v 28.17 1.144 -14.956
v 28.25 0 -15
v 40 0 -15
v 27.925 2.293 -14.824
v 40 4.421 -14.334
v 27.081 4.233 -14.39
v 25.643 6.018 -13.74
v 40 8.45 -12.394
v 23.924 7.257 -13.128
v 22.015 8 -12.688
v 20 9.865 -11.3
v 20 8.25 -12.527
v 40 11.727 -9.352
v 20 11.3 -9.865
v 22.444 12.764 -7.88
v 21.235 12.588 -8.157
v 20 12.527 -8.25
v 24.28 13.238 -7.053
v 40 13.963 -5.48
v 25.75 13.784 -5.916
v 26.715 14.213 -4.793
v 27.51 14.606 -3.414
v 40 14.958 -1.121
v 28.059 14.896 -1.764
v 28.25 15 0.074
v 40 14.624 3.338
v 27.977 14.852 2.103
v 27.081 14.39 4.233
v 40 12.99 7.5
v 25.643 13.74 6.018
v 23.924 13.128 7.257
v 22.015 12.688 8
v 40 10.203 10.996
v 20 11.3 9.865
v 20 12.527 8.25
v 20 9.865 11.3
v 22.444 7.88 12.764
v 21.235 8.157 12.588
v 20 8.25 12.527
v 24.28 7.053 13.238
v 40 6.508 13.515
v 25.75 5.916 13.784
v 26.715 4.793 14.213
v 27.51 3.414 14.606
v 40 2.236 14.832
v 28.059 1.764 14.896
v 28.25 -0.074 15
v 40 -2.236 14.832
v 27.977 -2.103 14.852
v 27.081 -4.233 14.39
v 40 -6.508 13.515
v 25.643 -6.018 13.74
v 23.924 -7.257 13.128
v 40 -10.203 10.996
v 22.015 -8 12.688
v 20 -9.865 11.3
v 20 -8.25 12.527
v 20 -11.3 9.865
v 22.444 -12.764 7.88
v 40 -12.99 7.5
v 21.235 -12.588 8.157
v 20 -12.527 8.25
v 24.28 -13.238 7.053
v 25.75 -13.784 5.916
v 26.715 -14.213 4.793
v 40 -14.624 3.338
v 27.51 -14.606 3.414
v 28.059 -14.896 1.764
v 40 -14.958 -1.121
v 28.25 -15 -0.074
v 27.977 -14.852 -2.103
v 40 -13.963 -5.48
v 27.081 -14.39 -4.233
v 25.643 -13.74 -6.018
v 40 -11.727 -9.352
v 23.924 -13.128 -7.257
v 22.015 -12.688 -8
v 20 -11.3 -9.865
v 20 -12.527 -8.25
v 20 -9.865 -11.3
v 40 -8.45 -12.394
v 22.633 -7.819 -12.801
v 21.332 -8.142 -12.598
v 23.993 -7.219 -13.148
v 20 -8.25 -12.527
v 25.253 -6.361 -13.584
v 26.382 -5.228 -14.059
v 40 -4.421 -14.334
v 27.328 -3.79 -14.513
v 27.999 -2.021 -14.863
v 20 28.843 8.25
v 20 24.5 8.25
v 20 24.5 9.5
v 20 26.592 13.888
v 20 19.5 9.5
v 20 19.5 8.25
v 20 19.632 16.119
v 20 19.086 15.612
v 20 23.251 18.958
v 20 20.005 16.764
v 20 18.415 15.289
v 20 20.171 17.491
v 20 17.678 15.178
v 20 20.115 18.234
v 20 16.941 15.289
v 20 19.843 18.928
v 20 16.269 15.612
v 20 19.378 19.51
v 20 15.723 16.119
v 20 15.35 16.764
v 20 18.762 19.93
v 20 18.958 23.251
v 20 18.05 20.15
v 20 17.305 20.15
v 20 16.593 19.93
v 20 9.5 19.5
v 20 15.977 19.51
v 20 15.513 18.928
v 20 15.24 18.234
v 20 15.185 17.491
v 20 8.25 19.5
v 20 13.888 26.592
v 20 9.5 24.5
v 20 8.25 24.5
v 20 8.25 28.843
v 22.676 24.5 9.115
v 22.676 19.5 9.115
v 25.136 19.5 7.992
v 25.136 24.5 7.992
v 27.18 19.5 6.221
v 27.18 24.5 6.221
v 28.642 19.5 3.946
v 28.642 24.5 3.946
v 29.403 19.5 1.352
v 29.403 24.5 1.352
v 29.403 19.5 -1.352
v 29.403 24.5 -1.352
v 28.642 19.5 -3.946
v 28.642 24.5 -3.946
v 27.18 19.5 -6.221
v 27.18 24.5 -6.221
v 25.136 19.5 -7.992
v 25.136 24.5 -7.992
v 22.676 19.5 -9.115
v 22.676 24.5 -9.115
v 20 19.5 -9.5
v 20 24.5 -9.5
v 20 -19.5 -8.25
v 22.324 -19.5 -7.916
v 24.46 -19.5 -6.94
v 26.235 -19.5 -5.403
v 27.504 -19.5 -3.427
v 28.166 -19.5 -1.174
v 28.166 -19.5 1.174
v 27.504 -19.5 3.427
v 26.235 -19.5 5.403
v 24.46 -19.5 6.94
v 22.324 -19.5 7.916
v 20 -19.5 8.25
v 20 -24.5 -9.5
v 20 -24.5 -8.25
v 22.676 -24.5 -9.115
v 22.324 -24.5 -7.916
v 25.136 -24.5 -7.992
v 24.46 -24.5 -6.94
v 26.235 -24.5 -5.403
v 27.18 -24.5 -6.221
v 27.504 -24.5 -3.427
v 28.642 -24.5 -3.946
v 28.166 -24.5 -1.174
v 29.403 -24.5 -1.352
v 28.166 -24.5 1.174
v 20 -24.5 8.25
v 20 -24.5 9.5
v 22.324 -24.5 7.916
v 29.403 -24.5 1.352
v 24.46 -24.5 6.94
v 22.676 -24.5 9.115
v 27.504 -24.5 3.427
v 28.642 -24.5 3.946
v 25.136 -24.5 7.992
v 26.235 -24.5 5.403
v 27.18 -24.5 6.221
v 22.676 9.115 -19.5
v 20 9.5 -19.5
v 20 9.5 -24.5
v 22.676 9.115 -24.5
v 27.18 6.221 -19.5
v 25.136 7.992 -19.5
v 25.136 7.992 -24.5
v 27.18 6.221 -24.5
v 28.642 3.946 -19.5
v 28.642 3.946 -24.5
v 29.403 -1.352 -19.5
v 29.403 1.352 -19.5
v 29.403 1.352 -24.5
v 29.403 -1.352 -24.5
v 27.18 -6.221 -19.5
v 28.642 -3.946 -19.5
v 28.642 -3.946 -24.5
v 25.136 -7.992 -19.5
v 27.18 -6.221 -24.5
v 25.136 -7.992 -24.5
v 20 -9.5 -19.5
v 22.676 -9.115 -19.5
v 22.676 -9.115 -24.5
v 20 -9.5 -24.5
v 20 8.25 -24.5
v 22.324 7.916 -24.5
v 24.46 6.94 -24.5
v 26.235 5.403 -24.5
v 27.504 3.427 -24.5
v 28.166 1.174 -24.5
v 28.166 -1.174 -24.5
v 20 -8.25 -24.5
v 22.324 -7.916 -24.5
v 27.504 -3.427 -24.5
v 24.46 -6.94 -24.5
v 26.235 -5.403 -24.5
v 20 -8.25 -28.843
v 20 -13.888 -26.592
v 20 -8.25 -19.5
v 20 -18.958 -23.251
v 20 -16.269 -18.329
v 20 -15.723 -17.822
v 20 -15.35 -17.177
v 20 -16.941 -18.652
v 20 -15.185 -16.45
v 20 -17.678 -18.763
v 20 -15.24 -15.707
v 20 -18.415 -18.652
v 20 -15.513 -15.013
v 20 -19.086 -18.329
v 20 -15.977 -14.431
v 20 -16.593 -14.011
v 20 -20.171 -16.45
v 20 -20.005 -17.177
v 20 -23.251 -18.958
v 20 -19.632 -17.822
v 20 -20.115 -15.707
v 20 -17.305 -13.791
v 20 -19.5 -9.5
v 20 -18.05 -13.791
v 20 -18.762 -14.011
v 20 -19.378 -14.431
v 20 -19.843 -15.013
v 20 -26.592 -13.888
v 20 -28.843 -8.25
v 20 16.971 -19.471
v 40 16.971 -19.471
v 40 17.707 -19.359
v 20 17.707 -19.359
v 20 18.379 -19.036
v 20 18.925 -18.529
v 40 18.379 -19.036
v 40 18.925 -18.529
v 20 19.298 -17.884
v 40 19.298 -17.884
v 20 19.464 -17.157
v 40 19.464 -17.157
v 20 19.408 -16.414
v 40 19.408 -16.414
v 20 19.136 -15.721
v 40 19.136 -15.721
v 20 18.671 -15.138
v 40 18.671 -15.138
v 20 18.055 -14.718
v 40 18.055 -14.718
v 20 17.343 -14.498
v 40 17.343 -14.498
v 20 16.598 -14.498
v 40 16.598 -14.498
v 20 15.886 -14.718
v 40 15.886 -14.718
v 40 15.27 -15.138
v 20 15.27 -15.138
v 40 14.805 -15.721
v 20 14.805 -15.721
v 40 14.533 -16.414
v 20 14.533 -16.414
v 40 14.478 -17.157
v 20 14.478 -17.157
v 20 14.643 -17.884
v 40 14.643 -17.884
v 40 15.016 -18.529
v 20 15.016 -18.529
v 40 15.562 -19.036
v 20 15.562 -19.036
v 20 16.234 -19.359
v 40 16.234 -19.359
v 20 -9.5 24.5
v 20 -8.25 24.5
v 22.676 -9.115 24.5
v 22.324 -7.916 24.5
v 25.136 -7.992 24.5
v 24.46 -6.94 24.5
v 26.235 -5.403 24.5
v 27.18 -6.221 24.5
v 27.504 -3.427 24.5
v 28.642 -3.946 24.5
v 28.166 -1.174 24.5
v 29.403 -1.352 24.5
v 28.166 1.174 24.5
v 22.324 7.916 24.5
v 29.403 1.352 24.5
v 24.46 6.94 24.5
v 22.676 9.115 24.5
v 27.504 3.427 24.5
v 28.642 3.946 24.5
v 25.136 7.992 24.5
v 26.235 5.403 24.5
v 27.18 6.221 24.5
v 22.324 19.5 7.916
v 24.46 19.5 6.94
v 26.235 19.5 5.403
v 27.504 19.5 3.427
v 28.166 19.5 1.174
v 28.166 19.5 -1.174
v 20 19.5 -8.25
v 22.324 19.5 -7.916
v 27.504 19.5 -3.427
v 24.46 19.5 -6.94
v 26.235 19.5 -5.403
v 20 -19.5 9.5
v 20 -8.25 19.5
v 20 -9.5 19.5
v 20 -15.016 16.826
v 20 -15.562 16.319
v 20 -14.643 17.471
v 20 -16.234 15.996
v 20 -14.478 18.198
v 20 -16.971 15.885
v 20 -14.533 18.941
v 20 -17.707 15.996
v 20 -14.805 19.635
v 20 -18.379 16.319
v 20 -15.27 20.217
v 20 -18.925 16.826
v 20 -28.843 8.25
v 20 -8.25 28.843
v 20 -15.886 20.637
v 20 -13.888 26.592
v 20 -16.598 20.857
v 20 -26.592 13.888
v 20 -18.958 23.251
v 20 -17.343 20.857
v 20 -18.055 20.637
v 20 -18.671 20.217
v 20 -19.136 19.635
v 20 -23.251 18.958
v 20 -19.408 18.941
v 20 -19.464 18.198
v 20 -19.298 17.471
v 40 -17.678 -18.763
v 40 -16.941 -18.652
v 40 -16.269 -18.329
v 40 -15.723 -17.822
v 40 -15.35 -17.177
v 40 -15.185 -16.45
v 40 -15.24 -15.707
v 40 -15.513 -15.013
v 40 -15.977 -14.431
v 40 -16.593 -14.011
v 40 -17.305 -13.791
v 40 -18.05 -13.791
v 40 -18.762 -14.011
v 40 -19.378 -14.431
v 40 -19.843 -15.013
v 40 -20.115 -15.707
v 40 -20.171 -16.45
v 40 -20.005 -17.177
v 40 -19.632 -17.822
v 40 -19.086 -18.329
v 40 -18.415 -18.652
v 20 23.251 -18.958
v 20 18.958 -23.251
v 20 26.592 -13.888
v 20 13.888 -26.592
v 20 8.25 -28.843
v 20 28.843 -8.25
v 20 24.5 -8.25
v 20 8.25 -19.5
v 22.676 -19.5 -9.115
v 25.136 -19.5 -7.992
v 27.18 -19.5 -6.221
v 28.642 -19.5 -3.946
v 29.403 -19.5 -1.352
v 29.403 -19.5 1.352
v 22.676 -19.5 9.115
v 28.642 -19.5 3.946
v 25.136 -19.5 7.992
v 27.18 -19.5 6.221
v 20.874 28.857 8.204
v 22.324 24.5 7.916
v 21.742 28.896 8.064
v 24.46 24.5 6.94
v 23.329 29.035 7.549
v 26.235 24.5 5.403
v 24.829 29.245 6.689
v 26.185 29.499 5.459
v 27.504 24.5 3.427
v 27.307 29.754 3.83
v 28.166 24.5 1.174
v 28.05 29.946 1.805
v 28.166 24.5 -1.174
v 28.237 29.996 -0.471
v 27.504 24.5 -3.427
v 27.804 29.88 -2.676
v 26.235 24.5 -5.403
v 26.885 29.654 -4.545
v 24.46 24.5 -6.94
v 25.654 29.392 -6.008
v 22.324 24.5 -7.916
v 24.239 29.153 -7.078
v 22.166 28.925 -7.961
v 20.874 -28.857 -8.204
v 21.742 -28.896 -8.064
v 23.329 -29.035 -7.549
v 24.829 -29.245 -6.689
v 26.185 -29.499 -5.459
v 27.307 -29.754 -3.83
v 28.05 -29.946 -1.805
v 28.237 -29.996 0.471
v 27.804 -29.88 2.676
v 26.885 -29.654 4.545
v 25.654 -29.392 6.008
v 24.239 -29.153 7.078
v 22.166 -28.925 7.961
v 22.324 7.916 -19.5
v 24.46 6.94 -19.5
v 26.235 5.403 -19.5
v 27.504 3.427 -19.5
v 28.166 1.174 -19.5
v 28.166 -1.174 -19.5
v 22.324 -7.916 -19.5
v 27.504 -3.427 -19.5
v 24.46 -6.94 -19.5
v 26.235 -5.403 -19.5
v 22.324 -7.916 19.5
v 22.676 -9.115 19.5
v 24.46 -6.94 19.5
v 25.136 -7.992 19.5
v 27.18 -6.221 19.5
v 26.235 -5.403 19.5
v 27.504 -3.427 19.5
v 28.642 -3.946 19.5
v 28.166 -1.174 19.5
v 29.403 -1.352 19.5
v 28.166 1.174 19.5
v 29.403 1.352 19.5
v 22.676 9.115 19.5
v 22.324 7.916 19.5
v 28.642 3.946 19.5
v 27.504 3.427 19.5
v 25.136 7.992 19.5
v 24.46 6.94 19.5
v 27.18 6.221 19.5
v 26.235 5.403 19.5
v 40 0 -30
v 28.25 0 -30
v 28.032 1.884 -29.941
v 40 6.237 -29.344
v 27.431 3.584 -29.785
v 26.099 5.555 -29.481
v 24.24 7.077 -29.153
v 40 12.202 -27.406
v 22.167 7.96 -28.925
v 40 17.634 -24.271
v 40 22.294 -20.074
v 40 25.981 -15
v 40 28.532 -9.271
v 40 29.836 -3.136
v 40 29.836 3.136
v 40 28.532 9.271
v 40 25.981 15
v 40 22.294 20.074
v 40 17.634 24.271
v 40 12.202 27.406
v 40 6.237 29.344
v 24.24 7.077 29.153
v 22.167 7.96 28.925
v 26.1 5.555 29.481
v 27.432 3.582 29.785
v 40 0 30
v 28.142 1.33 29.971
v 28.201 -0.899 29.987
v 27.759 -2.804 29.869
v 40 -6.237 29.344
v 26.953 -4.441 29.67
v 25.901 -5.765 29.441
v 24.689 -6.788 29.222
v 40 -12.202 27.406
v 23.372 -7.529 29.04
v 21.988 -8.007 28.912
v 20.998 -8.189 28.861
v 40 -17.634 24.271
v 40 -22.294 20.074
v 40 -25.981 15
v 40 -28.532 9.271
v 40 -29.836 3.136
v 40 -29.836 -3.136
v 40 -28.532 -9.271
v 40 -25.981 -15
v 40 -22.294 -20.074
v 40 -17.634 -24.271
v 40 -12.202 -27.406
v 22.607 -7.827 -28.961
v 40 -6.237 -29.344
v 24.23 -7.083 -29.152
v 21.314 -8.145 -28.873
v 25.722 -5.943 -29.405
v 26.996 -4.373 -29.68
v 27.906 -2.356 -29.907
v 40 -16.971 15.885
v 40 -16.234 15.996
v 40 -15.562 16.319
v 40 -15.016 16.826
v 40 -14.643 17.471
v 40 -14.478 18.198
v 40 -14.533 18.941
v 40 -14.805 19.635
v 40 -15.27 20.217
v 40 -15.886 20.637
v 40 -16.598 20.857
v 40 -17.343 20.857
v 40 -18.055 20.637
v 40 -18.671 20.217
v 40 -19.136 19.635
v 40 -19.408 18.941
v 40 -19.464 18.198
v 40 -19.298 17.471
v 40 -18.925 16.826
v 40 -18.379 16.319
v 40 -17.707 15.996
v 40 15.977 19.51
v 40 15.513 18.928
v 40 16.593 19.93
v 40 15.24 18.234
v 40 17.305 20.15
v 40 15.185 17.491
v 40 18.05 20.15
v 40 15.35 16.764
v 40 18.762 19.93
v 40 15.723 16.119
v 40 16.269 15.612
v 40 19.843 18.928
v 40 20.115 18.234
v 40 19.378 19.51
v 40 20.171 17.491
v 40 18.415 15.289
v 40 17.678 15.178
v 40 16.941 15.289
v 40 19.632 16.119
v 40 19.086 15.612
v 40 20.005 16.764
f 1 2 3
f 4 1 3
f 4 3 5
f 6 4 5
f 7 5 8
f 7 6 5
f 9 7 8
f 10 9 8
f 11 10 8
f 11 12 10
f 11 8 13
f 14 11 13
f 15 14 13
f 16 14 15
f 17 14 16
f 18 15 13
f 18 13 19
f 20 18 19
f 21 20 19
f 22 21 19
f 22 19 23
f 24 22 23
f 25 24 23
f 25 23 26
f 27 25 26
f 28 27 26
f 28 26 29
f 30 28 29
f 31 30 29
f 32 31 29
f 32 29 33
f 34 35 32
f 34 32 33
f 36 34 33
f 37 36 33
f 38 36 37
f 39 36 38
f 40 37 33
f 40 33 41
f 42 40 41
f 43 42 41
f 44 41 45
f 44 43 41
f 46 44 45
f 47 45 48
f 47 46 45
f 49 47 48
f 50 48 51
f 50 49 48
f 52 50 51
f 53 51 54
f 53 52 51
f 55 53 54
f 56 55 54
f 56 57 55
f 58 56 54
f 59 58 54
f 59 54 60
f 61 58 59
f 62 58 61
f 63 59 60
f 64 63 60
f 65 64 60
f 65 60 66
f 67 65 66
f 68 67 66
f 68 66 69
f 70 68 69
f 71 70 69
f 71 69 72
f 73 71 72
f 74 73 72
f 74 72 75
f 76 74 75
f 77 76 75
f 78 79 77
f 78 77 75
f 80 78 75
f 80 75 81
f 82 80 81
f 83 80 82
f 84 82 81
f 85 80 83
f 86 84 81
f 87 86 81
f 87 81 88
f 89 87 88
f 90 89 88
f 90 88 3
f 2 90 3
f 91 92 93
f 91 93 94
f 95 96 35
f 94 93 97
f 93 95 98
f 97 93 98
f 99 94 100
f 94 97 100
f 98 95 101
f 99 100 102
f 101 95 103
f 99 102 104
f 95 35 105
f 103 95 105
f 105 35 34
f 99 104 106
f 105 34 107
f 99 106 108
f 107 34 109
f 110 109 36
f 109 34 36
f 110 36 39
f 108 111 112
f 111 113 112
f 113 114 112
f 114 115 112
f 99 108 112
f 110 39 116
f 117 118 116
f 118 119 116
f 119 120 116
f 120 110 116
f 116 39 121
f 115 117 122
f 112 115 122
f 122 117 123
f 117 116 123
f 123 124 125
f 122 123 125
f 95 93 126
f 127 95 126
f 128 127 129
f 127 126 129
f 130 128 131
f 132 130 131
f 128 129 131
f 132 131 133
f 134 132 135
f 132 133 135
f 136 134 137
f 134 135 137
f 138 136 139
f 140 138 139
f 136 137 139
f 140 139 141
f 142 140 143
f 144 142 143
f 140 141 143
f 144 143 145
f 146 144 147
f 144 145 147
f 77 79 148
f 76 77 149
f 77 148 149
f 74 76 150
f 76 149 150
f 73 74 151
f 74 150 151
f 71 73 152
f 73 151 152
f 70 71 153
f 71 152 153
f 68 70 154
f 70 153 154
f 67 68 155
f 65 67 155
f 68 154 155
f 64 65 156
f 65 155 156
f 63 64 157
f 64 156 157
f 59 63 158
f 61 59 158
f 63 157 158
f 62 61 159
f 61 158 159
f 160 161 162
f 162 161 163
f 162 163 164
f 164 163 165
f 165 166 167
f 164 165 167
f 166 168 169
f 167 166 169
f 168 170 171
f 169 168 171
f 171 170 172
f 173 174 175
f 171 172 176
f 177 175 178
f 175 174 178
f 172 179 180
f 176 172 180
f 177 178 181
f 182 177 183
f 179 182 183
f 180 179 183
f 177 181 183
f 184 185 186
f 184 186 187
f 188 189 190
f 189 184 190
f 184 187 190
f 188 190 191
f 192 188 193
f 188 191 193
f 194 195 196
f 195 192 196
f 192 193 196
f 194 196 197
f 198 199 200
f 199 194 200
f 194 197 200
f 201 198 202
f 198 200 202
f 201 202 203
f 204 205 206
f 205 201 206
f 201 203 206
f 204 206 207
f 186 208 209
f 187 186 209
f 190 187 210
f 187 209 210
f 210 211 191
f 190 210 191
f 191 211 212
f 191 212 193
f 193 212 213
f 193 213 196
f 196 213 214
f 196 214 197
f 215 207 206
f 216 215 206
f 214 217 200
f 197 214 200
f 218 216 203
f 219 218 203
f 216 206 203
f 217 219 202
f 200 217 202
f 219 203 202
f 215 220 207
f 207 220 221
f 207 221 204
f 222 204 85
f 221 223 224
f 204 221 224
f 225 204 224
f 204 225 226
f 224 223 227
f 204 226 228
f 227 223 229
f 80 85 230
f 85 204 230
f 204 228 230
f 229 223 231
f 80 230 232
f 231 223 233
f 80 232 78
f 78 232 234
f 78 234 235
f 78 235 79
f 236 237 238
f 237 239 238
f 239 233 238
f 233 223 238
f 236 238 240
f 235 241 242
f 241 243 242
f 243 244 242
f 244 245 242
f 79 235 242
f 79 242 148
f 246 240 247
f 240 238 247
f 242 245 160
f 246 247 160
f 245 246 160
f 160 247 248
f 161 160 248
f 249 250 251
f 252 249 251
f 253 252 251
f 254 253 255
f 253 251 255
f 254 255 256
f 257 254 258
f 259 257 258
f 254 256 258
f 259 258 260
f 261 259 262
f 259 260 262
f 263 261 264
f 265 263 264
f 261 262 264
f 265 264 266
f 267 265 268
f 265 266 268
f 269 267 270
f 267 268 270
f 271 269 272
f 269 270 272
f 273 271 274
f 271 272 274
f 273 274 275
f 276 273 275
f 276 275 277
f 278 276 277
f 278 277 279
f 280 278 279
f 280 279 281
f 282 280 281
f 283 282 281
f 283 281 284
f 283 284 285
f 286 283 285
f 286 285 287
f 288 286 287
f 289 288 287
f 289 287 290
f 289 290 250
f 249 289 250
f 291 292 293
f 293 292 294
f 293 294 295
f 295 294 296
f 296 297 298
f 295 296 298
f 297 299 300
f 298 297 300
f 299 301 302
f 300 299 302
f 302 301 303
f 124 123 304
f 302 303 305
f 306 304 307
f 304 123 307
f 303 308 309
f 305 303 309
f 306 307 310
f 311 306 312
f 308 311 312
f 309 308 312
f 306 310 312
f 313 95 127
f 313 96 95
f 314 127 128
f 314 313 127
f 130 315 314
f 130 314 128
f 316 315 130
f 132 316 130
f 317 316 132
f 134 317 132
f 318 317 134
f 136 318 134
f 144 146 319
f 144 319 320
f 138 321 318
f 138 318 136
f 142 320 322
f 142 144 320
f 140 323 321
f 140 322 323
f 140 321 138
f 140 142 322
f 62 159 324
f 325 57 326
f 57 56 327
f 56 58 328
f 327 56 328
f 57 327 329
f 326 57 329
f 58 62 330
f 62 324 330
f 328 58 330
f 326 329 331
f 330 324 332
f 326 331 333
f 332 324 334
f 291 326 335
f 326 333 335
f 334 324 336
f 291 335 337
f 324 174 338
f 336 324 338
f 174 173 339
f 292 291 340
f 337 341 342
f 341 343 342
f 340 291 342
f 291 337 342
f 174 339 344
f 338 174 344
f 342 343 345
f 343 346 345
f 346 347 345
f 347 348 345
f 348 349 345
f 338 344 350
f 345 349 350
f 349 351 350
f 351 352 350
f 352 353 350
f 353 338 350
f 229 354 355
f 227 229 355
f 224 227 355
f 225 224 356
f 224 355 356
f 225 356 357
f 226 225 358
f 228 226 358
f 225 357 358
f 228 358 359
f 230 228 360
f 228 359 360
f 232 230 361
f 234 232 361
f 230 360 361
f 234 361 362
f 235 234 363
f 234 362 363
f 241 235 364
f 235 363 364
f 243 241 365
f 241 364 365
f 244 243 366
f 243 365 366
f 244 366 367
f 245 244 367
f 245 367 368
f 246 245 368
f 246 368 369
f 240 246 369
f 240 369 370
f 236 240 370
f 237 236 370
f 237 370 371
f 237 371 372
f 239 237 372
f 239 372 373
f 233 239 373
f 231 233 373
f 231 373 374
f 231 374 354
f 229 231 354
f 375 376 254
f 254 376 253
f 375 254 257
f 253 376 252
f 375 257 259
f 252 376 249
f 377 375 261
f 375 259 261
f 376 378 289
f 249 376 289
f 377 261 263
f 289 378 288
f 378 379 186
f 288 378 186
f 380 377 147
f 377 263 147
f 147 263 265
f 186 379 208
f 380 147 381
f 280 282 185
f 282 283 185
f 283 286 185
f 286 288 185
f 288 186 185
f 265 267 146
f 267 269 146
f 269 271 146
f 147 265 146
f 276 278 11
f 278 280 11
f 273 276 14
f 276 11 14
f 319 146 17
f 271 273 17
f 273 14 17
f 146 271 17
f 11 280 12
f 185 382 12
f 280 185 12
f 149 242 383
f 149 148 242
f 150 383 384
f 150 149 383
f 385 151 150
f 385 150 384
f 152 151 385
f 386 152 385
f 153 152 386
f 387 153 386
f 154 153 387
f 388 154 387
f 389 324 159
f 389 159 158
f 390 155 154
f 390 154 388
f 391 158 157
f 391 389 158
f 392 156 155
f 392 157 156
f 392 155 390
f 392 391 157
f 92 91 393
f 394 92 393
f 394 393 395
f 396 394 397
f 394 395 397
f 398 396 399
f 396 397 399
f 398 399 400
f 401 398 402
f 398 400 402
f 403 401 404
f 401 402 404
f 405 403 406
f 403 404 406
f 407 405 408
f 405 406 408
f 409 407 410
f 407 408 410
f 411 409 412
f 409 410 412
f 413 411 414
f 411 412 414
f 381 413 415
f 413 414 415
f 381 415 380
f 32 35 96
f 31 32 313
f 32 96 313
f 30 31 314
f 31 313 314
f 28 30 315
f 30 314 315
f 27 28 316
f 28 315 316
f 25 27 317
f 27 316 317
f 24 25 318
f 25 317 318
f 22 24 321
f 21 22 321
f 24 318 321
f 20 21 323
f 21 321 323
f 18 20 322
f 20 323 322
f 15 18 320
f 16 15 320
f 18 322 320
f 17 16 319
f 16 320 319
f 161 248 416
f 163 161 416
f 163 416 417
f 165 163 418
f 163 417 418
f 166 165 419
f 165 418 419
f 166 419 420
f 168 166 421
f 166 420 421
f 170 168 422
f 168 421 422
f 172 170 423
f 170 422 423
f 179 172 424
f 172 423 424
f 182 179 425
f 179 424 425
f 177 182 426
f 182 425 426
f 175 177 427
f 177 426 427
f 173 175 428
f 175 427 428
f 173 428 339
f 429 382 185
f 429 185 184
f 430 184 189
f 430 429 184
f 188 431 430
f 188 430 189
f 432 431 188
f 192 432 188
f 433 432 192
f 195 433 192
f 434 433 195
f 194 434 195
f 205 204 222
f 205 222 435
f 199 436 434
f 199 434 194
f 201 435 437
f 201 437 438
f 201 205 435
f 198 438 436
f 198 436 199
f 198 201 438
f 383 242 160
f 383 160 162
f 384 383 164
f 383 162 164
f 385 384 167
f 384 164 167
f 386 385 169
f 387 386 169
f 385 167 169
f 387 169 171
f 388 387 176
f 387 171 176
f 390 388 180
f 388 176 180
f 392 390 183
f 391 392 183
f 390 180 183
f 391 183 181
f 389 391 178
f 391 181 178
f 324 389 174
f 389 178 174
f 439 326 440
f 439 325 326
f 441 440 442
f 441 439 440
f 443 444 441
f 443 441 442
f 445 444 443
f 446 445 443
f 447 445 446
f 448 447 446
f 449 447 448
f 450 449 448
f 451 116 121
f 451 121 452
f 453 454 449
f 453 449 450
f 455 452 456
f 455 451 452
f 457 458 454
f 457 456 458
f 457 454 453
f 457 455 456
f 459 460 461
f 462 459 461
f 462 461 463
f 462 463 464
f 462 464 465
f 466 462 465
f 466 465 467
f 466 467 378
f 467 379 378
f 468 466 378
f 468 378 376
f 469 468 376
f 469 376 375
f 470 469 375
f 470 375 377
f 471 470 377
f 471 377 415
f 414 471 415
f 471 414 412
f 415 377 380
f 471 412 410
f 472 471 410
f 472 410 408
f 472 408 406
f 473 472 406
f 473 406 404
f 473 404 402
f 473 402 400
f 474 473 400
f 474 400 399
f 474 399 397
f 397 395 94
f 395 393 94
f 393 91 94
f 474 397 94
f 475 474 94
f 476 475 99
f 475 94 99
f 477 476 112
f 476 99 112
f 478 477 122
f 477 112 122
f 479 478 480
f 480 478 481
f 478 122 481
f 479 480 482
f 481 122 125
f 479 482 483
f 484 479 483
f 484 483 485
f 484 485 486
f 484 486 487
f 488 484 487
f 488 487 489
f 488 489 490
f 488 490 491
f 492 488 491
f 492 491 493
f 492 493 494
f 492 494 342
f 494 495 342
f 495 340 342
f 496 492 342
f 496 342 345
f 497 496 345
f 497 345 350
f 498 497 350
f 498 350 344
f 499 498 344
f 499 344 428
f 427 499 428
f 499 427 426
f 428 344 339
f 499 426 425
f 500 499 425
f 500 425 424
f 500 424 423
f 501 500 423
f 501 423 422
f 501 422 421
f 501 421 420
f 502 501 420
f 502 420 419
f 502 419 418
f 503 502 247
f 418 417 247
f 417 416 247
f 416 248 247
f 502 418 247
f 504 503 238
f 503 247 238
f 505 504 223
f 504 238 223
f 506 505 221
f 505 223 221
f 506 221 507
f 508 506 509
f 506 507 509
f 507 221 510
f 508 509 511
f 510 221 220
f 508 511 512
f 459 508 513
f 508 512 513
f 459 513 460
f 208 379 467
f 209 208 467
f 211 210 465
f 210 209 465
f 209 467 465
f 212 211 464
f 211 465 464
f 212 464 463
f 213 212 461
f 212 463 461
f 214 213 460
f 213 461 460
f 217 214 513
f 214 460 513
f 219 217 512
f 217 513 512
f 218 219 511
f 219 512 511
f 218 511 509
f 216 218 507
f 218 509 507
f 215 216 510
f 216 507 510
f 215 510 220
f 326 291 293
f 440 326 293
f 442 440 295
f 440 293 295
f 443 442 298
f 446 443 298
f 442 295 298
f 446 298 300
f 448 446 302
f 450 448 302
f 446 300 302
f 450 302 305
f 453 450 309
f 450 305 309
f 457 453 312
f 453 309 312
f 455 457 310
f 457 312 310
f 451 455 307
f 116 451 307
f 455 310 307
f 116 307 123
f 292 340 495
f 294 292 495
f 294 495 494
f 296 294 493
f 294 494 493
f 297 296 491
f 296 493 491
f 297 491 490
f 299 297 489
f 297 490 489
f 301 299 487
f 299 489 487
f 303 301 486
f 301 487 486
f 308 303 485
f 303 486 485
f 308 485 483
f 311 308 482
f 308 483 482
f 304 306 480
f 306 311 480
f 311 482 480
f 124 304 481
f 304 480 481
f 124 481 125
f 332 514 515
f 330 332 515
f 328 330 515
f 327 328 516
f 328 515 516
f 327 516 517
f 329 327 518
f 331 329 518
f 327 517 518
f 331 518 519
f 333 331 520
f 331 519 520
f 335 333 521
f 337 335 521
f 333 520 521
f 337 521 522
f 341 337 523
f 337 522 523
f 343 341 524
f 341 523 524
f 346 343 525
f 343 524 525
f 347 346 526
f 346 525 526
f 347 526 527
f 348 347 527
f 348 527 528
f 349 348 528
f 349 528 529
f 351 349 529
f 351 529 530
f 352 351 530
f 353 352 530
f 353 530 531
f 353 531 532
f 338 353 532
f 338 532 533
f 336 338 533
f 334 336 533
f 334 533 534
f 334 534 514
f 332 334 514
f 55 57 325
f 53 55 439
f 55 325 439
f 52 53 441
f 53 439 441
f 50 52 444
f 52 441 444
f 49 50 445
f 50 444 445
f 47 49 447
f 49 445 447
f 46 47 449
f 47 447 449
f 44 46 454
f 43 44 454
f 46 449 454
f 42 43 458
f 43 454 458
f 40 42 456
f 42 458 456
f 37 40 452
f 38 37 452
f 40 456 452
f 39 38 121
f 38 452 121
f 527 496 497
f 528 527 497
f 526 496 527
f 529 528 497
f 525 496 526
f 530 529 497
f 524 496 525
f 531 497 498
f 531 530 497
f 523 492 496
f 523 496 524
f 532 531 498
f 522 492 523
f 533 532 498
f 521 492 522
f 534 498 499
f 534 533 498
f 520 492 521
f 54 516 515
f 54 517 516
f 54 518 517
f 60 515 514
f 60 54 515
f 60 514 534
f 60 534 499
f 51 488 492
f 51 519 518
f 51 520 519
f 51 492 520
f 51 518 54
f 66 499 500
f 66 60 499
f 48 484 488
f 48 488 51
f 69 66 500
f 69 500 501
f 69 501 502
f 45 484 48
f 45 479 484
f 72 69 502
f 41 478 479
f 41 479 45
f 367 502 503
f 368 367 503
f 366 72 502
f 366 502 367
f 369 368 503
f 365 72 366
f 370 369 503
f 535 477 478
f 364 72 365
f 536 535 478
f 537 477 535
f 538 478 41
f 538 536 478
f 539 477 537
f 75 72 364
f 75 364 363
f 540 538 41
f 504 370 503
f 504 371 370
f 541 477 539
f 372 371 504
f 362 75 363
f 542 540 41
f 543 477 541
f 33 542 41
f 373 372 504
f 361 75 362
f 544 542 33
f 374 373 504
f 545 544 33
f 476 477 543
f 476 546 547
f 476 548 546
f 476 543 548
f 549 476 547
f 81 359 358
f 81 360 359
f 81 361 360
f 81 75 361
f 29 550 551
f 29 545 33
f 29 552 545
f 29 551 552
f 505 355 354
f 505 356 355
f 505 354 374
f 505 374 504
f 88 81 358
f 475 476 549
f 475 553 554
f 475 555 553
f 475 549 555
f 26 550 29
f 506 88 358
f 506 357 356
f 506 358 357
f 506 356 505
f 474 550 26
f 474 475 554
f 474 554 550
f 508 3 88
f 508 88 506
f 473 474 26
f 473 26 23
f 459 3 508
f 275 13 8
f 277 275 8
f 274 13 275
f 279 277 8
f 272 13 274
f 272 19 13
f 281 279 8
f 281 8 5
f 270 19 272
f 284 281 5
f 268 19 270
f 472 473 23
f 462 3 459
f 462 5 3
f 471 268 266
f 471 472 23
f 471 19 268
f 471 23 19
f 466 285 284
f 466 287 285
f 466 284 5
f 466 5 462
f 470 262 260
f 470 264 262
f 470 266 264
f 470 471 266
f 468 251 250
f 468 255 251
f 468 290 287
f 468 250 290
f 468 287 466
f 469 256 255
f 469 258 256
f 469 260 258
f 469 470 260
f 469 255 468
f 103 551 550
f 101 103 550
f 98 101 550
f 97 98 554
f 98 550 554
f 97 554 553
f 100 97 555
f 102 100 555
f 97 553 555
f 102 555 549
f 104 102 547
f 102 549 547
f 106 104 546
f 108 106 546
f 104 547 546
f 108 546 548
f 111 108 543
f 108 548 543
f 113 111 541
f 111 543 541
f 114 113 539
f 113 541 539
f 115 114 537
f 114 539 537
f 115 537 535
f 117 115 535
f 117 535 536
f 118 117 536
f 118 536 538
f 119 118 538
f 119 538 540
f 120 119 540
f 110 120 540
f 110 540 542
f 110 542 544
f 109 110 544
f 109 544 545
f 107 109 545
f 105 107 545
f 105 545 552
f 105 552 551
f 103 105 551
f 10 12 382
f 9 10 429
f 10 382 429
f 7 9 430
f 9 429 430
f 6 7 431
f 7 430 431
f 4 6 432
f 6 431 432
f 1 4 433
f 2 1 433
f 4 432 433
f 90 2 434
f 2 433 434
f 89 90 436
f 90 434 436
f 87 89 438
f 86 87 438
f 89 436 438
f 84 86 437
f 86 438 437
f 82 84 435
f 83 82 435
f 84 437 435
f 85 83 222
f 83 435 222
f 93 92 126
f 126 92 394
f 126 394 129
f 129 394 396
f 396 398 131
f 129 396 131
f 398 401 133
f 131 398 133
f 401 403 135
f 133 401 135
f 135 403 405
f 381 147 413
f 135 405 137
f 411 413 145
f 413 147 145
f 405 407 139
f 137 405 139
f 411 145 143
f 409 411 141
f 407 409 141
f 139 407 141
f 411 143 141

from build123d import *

# Parameters (mm, degrees)
SKETCH1_R           = 30
SKETCH1_R_2         = 15
BOSS_EXTRUDE1_DEPTH = 40
SKETCH2_R           = 9.5
CUT_EXTRUDE1_DEPTH  = 2.5
SKETCH3_R           = 8.25
CUT_EXTRUDE2_DEPTH  = 15
CIRPATTERN1_COUNT   = 4
SKETCH4_R           = 2.5
CUT_EXTRUDE3_DEPTH  = 47.904157769


with BuildPart() as part:
    # Sketch1 → Boss-Extrude1 (new body)
    with BuildSketch(Plane(origin=(0, 0, 0), x_dir=(0, 0, -1), z_dir=(1, 0, 0))):
        Circle(SKETCH1_R)
        Circle(SKETCH1_R_2, mode=Mode.SUBTRACT)
    extrude(amount=BOSS_EXTRUDE1_DEPTH)

    # Sketch2 → Cut-Extrude1 (cut, symmetric)
    with BuildSketch(Plane.XY.offset(22)):
        with Locations((20, 0)):
            Circle(SKETCH2_R)
    cut_extrude1 = extrude(amount=CUT_EXTRUDE1_DEPTH, both=True, mode=Mode.SUBTRACT)

    # Sketch3 → Cut-Extrude2 (cut, symmetric)
    with BuildSketch(Plane.XY.offset(22)):
        with Locations((20, 0)):
            Circle(SKETCH3_R)
    cut_extrude2 = extrude(amount=CUT_EXTRUDE2_DEPTH, both=True, mode=Mode.SUBTRACT)

    # CirPattern1: Cut-Extrude1, Cut-Extrude2 ×4 about axis
    cirpattern1_axis = Axis((40, 0, 0), (1, 0, 0))
    add([cut_extrude1.rotate(cirpattern1_axis, i * 360 / CIRPATTERN1_COUNT) for i in range(1, CIRPATTERN1_COUNT)], mode=Mode.SUBTRACT)
    add([cut_extrude2.rotate(cirpattern1_axis, i * 360 / CIRPATTERN1_COUNT) for i in range(1, CIRPATTERN1_COUNT)], mode=Mode.SUBTRACT)


with BuildPart() as body_2:
    # Split2: the piece on the far side of the plane
    add(part.part)
    split(bisect_by=Plane(origin=(20, 0, 0), x_dir=(0, 0, 1), z_dir=(1, 0, 0)), keep=Keep.BOTTOM)


with BuildPart() as part_1:
    add(part.part)

    # Split2
    split(bisect_by=Plane(origin=(20, 0, 0), x_dir=(0, 0, 1), z_dir=(1, 0, 0)), keep=Keep.TOP)

    # Sketch4 → Cut-Extrude3 (cut, through all)
    with BuildSketch(Plane(origin=(40, 0, 0), x_dir=(0, 0, -1), z_dir=(1, 0, 0))):
        with Locations((-17.67766953, 17.67766953)):
            Circle(SKETCH4_R)
        with Locations((16.970562748, 16.970562748)):
            Circle(SKETCH4_R)
        with Locations((16.263455967, -17.67766953)):
            Circle(SKETCH4_R)
        with Locations((-18.384776311, -16.970562748)):
            Circle(SKETCH4_R)
    extrude(amount=-CUT_EXTRUDE3_DEPTH, mode=Mode.SUBTRACT)


solid = part_1.part
